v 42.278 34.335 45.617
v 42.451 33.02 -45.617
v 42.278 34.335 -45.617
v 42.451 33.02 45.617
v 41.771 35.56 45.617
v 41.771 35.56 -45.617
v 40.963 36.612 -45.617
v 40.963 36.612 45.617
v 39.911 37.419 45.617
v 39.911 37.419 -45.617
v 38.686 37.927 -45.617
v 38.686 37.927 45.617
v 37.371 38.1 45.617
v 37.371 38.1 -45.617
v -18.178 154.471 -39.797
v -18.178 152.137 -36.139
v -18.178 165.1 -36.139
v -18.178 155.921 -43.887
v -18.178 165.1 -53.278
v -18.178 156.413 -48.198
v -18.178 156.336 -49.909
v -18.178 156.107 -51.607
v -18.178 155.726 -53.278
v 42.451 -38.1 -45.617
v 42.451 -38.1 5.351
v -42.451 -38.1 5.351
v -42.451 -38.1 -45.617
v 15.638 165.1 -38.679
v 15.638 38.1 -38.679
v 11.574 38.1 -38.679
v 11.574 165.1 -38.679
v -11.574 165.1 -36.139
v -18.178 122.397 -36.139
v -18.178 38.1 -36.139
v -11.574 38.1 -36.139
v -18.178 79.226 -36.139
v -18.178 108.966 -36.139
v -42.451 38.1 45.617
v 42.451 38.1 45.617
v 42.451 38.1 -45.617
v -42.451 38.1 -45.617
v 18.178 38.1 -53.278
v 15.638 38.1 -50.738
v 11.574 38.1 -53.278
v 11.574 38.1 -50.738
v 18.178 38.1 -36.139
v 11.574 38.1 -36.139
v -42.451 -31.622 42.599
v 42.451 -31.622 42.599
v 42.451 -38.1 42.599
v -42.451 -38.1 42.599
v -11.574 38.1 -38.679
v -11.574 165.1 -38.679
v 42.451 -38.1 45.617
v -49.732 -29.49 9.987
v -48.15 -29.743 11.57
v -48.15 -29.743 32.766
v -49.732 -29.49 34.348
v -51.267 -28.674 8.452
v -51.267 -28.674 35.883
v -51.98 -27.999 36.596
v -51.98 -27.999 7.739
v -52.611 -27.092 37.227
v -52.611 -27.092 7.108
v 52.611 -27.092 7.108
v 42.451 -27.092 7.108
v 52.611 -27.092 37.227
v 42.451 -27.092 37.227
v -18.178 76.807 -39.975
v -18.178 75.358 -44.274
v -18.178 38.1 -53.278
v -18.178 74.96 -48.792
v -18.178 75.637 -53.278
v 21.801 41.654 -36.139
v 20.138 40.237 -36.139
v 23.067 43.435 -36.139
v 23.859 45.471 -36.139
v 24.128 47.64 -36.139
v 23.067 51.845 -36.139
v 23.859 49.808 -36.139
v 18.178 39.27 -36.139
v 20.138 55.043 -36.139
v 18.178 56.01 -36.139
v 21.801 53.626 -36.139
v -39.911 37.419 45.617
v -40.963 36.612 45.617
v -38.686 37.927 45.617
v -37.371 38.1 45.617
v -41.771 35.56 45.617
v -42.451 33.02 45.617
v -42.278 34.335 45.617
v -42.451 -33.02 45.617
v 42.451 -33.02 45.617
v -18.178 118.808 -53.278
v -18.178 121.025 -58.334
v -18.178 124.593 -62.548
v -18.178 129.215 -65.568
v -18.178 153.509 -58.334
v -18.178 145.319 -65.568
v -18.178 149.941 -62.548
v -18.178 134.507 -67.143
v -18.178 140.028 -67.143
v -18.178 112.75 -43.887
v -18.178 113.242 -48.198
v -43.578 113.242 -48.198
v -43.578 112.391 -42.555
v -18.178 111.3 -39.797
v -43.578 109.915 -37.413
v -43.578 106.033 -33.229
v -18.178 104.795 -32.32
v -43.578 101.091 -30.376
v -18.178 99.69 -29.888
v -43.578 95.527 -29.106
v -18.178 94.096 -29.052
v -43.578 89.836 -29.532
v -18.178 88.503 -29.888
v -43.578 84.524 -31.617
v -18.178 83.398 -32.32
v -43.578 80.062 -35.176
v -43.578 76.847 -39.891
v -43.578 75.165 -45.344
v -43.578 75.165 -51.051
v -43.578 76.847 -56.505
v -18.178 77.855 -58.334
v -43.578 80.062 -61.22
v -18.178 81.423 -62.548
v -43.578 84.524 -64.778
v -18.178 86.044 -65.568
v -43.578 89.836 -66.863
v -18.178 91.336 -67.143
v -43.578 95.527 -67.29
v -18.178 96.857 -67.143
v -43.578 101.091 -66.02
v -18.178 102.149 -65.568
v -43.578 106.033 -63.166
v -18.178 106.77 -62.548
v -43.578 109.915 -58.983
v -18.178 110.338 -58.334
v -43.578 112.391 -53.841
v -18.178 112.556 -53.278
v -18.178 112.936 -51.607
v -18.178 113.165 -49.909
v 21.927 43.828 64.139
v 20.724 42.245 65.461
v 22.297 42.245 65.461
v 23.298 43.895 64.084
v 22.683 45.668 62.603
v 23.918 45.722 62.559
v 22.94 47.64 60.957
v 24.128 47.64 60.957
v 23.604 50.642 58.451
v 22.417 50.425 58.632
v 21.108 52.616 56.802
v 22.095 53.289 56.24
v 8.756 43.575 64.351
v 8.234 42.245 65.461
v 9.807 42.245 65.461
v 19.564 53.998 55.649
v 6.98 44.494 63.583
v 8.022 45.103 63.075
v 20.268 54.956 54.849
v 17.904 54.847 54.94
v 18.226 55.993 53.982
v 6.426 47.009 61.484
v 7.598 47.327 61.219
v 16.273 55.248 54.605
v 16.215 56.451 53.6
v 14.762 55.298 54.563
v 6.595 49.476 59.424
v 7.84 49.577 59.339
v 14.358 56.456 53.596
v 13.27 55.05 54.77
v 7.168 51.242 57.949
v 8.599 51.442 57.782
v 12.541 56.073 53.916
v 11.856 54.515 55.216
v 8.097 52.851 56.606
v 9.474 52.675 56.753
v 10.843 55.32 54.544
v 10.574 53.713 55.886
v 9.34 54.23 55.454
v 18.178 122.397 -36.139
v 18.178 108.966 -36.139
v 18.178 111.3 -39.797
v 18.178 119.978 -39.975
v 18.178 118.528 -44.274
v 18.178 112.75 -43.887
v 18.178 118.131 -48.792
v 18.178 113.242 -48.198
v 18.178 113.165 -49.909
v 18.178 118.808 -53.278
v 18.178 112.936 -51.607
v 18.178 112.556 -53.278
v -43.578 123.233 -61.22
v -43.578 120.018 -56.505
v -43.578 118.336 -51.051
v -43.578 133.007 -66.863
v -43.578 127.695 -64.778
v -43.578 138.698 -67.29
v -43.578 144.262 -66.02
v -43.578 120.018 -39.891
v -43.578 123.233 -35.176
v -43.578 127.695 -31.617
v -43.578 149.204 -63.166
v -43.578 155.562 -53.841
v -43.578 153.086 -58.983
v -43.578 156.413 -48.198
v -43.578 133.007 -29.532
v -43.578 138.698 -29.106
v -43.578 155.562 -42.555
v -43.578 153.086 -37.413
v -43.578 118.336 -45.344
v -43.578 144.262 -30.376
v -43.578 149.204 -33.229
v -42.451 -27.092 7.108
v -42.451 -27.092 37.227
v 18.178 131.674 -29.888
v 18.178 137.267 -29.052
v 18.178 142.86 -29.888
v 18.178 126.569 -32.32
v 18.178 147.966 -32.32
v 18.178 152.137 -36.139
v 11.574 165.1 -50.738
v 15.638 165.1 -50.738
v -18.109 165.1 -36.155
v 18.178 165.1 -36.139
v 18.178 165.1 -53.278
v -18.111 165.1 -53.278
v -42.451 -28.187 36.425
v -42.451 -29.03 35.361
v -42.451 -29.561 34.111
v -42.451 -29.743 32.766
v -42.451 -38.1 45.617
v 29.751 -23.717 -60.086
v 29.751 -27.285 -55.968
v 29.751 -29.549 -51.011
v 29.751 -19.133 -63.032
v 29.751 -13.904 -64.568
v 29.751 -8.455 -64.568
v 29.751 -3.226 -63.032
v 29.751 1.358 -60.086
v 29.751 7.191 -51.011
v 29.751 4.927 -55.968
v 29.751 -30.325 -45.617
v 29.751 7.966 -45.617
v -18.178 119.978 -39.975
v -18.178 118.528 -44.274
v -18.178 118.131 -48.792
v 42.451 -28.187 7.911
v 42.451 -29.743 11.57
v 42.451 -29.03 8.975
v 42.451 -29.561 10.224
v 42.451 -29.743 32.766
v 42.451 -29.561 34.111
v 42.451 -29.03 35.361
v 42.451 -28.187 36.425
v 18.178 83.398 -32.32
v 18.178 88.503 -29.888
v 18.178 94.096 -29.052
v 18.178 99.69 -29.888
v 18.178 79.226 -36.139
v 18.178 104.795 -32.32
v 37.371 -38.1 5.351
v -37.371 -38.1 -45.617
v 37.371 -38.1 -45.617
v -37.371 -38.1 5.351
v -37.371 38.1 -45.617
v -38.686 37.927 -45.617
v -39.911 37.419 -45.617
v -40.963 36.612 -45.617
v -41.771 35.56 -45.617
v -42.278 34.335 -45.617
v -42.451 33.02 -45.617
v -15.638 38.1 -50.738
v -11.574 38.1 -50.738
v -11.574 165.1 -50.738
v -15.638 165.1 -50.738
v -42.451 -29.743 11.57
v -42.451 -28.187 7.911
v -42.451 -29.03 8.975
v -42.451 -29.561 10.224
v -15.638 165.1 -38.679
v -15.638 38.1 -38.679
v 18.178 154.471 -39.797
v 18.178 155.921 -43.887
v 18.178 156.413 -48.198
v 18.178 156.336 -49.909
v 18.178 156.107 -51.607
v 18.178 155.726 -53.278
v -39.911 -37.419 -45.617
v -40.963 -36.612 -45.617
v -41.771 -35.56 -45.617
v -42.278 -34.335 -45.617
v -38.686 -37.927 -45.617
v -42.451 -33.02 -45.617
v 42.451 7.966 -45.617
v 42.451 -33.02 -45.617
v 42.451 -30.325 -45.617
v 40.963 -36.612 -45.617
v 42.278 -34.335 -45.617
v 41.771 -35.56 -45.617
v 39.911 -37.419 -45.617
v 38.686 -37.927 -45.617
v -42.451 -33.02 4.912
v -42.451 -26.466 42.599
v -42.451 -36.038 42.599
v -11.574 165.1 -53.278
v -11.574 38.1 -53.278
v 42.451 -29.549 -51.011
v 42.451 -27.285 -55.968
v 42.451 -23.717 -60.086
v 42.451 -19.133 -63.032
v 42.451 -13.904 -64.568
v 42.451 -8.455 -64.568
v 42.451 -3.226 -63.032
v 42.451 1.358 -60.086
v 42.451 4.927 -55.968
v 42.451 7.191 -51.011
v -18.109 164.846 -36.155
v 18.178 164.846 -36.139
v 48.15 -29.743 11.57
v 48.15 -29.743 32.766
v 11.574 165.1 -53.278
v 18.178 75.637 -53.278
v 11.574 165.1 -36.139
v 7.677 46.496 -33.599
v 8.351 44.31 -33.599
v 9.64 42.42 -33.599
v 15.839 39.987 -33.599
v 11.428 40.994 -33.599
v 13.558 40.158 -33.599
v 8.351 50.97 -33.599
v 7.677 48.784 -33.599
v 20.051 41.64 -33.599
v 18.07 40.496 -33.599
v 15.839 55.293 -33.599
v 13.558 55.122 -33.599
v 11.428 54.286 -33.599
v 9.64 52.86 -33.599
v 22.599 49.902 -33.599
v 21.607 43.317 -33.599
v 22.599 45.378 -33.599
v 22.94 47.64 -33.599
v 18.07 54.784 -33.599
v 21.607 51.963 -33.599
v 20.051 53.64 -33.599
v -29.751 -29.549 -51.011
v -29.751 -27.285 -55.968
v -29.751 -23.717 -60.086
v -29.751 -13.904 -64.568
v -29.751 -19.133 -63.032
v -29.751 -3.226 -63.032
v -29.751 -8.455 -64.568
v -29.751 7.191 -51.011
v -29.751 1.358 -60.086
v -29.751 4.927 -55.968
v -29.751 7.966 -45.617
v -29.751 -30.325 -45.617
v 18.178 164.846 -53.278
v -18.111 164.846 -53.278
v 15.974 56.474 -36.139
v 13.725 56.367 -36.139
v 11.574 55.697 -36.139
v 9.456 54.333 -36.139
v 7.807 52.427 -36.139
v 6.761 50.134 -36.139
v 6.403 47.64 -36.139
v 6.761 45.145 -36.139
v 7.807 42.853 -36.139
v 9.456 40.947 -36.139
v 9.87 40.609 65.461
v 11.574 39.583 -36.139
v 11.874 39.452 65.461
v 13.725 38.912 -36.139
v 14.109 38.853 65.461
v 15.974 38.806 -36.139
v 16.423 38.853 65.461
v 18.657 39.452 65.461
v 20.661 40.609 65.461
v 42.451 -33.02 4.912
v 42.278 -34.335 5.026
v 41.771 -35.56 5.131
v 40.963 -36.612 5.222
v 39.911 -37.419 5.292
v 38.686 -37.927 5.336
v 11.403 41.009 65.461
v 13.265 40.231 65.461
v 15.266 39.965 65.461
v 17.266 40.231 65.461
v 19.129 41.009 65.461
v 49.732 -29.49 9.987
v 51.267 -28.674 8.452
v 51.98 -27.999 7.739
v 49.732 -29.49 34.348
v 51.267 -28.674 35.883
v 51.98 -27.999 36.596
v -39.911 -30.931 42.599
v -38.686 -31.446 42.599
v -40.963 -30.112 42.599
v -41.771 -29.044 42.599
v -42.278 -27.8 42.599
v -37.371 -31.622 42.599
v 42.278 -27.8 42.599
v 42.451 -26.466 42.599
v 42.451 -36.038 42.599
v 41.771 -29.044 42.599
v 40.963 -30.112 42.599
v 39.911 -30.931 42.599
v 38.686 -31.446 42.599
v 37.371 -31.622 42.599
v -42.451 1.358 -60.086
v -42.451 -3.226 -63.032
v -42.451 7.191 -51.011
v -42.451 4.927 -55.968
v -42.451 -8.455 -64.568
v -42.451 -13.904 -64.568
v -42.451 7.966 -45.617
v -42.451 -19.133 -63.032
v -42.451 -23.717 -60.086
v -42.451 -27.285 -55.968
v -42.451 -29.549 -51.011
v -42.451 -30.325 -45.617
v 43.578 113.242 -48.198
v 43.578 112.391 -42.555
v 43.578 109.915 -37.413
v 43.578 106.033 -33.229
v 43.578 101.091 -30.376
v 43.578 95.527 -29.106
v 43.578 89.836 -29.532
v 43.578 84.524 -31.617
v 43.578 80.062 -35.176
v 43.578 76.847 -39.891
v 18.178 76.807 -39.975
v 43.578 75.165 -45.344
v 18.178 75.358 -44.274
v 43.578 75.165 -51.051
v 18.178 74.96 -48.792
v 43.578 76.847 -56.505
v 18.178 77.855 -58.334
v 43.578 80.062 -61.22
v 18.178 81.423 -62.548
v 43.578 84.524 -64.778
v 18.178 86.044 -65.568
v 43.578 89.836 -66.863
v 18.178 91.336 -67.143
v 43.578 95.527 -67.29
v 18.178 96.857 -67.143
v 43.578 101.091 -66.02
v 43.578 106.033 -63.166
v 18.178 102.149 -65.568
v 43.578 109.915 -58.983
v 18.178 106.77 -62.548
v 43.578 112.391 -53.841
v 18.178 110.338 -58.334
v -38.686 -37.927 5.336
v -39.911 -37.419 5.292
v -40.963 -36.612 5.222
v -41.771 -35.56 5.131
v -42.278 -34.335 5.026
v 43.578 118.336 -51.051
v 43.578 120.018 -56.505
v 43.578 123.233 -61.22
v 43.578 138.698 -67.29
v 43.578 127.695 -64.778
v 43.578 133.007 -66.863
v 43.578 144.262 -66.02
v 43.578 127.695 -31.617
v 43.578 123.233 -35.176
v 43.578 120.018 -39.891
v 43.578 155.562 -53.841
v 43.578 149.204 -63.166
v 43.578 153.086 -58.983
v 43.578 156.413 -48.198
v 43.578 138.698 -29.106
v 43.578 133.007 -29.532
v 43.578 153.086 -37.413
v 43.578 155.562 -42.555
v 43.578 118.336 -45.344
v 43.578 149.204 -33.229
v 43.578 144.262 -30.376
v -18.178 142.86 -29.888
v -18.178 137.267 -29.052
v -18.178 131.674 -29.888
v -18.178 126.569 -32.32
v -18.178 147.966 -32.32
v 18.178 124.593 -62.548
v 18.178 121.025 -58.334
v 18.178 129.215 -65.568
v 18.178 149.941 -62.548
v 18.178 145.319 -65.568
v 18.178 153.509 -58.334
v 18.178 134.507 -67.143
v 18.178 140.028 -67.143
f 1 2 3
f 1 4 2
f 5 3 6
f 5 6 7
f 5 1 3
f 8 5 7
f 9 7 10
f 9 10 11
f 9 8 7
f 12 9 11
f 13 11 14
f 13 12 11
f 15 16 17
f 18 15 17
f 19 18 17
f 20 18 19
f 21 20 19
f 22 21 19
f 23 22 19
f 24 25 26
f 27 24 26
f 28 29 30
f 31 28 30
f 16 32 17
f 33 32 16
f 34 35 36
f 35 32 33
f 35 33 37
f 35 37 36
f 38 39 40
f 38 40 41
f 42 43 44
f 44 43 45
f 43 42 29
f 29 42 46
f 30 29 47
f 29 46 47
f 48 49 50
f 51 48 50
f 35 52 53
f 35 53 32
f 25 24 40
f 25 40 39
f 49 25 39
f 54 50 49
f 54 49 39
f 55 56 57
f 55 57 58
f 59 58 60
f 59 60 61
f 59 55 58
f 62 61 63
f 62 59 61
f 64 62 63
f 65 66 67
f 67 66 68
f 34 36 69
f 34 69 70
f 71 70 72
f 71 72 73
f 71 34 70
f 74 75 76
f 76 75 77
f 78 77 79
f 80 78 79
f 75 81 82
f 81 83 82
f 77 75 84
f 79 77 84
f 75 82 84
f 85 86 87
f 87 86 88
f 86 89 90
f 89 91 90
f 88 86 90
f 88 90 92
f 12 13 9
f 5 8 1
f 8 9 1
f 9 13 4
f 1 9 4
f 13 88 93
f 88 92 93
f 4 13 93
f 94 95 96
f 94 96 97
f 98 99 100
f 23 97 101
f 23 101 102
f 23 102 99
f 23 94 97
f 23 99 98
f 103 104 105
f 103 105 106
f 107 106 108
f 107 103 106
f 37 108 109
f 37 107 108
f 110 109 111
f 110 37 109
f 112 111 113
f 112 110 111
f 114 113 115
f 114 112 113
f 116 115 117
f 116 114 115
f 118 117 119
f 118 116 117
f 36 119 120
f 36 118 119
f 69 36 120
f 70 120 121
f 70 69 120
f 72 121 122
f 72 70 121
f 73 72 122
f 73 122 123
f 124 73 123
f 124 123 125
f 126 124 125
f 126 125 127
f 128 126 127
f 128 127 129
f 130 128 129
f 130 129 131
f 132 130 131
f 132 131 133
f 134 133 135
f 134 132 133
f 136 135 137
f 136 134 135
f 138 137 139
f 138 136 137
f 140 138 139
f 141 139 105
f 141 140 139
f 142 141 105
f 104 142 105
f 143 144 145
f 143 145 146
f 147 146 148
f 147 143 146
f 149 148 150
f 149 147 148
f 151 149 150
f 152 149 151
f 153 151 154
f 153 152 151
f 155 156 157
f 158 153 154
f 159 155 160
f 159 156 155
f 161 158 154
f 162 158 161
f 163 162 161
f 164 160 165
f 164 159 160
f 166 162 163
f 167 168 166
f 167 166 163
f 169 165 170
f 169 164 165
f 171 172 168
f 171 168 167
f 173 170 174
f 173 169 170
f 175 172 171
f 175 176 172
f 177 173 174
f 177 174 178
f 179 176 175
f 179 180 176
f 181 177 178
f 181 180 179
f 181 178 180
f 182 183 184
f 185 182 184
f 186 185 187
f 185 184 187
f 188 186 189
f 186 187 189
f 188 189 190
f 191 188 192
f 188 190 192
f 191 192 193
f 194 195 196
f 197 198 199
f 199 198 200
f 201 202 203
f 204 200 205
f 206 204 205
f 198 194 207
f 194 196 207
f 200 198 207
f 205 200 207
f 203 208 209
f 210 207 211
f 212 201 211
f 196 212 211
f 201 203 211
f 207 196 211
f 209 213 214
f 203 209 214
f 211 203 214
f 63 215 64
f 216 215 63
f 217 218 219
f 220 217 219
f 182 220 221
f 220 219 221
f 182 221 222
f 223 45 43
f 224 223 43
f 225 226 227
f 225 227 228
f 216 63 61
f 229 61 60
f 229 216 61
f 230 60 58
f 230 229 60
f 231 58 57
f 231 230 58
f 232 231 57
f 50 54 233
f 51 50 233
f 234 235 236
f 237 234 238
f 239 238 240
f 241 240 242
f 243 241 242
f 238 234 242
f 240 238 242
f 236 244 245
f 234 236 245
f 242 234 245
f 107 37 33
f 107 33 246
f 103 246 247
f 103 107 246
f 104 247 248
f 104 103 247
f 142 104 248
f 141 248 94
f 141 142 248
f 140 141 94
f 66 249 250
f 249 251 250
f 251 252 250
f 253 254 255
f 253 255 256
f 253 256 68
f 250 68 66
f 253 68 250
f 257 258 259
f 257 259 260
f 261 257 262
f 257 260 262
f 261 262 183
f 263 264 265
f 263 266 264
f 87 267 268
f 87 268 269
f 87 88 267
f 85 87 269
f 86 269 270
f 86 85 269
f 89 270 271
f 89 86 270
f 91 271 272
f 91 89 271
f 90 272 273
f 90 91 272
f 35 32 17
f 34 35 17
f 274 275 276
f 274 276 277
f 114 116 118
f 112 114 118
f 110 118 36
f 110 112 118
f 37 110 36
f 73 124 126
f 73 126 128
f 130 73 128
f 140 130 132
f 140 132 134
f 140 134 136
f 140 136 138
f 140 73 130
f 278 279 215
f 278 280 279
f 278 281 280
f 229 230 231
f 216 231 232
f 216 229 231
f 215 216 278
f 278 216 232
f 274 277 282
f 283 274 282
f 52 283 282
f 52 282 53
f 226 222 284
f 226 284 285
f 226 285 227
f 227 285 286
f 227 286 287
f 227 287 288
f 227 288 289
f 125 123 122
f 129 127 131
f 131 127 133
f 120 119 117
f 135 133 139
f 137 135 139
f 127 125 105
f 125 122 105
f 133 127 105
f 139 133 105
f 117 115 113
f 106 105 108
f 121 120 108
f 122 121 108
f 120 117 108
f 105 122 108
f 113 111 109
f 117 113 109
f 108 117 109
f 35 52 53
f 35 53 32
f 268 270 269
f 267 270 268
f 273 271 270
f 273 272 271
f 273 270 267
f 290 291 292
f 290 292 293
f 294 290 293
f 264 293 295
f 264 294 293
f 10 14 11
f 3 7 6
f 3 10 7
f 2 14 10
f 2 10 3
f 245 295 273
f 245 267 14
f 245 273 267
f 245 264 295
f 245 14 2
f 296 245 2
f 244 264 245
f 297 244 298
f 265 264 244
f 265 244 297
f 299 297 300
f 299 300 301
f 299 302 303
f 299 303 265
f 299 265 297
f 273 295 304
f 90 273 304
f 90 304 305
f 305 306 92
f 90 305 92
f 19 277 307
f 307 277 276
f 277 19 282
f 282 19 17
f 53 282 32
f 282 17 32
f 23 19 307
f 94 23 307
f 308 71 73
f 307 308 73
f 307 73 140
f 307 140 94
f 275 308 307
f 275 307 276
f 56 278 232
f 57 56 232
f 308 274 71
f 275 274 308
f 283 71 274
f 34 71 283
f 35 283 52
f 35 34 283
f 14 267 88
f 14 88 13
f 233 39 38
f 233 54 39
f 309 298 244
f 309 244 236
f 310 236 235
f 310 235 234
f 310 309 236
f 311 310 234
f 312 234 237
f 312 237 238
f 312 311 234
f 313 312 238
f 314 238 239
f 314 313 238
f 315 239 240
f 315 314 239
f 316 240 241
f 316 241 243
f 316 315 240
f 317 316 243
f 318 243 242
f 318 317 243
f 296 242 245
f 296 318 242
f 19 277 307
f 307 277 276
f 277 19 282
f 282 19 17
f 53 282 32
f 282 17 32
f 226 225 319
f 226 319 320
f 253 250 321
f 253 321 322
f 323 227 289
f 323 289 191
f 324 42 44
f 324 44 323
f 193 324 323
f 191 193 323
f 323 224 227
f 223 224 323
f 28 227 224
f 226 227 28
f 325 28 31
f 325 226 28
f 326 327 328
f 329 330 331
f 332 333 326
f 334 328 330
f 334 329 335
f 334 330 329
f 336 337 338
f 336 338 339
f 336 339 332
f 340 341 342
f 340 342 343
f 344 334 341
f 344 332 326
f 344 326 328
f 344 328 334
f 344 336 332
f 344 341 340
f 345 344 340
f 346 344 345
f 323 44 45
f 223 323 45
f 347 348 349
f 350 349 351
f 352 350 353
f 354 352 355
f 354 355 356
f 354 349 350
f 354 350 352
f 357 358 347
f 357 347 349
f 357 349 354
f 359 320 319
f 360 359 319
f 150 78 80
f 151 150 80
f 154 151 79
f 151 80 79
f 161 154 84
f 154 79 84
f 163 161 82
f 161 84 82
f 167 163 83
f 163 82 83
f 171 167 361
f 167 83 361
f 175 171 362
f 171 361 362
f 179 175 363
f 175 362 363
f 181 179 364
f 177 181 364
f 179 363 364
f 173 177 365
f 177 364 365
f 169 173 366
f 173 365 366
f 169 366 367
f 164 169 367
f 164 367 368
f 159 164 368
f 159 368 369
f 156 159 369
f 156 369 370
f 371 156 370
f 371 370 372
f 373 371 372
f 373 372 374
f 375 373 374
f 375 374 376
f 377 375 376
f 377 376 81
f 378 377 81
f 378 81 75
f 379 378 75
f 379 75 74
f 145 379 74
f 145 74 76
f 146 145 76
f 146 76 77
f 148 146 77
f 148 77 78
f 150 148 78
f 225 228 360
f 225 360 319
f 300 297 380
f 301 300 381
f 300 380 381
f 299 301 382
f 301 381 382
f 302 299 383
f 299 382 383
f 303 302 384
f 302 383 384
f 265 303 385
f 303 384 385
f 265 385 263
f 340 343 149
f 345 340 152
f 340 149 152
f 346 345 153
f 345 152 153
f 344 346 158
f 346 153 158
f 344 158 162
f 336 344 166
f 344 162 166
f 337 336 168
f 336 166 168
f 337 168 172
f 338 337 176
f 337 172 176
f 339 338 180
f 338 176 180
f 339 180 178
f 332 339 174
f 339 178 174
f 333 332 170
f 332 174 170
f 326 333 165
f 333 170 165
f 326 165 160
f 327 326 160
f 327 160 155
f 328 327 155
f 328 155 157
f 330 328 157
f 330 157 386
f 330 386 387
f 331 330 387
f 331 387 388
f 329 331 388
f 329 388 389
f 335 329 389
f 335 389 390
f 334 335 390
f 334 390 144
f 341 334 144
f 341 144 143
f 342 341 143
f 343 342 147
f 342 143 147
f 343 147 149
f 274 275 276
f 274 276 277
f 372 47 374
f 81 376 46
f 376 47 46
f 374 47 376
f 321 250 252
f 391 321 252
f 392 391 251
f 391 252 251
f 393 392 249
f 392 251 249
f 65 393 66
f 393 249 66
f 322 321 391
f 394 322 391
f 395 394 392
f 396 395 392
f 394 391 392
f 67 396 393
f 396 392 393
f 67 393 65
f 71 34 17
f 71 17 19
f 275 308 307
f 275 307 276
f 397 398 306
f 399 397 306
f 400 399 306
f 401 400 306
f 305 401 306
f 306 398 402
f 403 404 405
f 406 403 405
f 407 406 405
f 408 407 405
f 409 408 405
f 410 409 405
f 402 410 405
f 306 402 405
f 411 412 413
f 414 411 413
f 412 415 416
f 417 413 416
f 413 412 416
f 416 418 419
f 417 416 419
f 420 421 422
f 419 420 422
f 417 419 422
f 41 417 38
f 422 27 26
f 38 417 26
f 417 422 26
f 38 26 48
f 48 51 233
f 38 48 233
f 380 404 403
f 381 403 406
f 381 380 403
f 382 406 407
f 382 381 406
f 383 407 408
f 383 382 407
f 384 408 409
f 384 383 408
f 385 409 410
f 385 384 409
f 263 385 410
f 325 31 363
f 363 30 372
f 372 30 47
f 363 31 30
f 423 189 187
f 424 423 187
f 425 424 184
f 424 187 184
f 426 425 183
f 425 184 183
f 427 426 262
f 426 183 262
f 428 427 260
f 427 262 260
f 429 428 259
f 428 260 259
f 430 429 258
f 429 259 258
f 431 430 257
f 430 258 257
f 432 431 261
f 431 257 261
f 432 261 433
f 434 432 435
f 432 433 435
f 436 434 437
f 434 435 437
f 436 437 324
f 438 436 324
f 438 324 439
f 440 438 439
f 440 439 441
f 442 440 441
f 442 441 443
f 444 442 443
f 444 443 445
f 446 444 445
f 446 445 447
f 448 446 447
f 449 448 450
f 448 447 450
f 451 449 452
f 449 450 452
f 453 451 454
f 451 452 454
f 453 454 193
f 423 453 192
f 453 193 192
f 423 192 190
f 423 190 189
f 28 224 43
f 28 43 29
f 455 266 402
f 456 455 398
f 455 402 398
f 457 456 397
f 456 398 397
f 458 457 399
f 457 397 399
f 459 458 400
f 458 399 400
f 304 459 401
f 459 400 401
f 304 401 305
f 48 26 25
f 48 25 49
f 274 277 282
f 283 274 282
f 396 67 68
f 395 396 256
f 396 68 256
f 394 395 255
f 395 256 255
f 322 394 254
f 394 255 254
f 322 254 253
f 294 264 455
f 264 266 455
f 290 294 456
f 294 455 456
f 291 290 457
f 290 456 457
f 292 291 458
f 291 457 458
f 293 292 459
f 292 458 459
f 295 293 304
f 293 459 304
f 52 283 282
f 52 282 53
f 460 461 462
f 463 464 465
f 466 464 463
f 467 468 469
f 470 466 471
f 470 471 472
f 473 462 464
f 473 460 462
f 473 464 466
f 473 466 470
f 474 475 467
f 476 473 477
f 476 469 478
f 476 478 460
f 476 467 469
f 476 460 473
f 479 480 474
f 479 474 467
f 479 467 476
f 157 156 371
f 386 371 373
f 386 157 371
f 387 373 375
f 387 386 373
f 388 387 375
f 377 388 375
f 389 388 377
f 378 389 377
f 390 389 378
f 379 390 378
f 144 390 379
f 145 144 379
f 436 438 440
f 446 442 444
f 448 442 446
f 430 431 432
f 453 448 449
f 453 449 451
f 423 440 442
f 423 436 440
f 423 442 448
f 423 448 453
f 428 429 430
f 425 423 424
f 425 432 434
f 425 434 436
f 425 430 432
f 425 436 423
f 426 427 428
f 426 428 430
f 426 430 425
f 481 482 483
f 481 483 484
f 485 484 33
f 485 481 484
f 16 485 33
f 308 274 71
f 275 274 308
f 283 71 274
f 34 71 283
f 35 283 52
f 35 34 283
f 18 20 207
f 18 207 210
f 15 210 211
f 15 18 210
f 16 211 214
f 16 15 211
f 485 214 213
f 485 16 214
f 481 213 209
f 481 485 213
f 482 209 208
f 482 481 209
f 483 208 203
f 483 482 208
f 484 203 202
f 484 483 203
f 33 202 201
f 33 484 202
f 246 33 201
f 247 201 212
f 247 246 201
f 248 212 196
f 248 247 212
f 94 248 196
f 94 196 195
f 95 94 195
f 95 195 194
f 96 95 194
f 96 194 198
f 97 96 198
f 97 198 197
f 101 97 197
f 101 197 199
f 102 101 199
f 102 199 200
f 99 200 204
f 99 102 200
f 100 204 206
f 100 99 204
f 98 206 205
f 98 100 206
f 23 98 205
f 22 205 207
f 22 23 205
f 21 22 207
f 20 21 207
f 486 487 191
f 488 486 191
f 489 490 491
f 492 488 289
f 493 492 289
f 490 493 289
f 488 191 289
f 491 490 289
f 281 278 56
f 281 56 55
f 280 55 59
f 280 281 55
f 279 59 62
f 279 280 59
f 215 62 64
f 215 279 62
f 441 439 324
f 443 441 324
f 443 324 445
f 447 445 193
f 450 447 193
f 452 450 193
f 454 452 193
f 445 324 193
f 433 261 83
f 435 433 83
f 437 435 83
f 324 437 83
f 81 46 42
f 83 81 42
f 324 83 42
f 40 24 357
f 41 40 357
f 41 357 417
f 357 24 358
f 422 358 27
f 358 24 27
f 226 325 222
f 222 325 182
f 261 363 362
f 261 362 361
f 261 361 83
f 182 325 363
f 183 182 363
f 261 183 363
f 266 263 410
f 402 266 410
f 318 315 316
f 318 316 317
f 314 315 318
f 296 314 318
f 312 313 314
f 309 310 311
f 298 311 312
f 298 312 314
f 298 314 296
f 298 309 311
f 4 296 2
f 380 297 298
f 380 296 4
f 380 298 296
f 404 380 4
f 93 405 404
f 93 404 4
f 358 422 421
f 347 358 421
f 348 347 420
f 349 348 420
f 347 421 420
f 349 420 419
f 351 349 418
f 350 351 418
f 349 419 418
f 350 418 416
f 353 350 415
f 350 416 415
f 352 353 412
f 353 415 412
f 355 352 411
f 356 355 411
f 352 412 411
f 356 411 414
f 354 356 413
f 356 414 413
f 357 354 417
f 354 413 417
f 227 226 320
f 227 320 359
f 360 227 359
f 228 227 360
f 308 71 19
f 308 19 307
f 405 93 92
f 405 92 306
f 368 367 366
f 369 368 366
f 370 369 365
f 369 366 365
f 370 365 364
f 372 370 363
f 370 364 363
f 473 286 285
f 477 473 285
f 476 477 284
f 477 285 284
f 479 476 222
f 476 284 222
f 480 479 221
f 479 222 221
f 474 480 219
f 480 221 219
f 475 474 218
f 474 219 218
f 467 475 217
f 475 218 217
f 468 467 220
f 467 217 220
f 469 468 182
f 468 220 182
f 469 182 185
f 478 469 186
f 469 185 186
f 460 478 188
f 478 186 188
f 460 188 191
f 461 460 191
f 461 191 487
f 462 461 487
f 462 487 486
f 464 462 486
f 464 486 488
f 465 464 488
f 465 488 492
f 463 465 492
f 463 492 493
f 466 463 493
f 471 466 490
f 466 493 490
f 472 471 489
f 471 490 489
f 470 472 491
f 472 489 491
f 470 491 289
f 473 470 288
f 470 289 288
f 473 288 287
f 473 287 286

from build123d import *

# Parameters (mm, degrees)
F0_W          = 84.9026963115
F0_H          = 91.2344232202
F1_DEPTH      = 38.1
F3_DEPTH      = 42.4523481557
F3_DEPTH_BACK = 42.4523481557
F4_R          = 19.1453288311
F5_DEPTH      = 12.7
F8_DEPTH      = 127
F10_R         = 19.1453262
F11_DEPTH     = 25.4
F13_R         = 5.08
F14_T1_DEPTH  = 111.0309954692
F15_R         = 8.8626036941
F16_DEPTH     = 101.6
F17_R         = 7.6745278719
F18_DEPTH     = 99.06
F20_DEPTH     = 43.5794721032
F21_W         = 2.6513483719
F21_H         = 30.1193892955
F22_DEPTH     = 10.16
F23_T1_DEPTH  = 32.4692196578
F23_T3_DEPTH  = 52.4286089533
F26_DEPTH     = 0.254


# Not quite as in the source:
# - a fillet or chamfer that OpenCascade refuses, or shapes differently, is made with other operations: its cross-section is extruded or revolved along the edge and cut away or added


with BuildPart() as f1:
    # F0 (on Front) → F1 (new body, symmetric)
    with BuildSketch(Plane.XZ):
        Rectangle(F0_W, F0_H)
    extrude(amount=F1_DEPTH, both=True)

    # F2 (on Right) → F3 (cut, two sides)
    with BuildSketch(Plane.YZ) as f3_sk:
        Polygon((-38.9483012259, 42.5993576646), (-38.1342619658, 5.1536280662), (-31.6219590604, 42.5993576646), align=None)
    extrude(amount=-F3_DEPTH, mode=Mode.SUBTRACT)
    extrude(f3_sk.sketch, amount=F3_DEPTH_BACK, mode=Mode.SUBTRACT)

    # F4 (on face) → F5 (join)
    with BuildSketch(Plane.YZ.offset(42.4513481557)):
        with Locations((-11.1792916432, -45.6172116101)):
            Circle(F4_R)
    extrude(amount=-F5_DEPTH)


with BuildPart() as f6_1:
    # F6: instance of F1
    add(f1.part.mirror(Plane.YZ))


with BuildPart() as f8:
    # F7 (on face) → F8 (new body)
    with BuildSketch(Plane(origin=(0, 38.1, 0), x_dir=(-1, 0, 0), z_dir=(0, 1, 0))):
        Polygon((-18.1784721032, -53.2778071603), (-11.5744721032, -53.2778071603), (-11.5744721032, -50.7378071603), (-15.6384721032, -50.7378071603), (-15.6384721032, -38.6785142068), (-11.5744721032, -38.6785142068), (-11.5744721032, -36.1385142068), (-18.1784721032, -36.1385142068), align=None)
    extrude(amount=F8_DEPTH)


with BuildPart() as f9_1:
    # F9: instance of F8
    add(f8.part.mirror(Plane.YZ))


with BuildPart() as f8_1:
    add(f8.part)

    # F10 (on face) → F11 (join)
    with BuildSketch(Plane.YZ.offset(18.1784721032)):
        with Locations((137.2673511505, -48.1978071603)):
            Circle(F10_R)
        with Locations((94.0964892507, -48.1978071603)):
            Circle(F10_R)
    extrude(amount=F11_DEPTH)


with BuildPart() as f12_1:
    # F12: instance of F8
    add(f8_1.part.mirror(Plane.YZ))


with BuildPart() as f1_1:
    add(f1.part)

    # F13
    f13_edges = [f1_1.edges().sort_by_distance(p)[0] for p in [
        (42.451348, -38.1, -20.133289),
        (42.451348, -34.86098, 23.974996),
        (-42.451348, -38.1, -20.133289),
        (-42.451348, -34.86098, 23.974996),
        (42.451348, 38.1, 0),
        (-42.451348, 38.1, 0),
    ]]
    fillet(f13_edges, radius=F13_R)

    # F14: chamfer of 5.08 on 1 edges, made by hand

    # F14_s2 → F14_t1 (cut)
    with BuildSketch(Plane.YZ.offset(-55.5154977346)):
        Polygon((-33.02, 45.6172116101), (-38.1, 40.5372116101), (-38.1, 45.6172116101), align=None)
    extrude(amount=F14_T1_DEPTH, mode=Mode.SUBTRACT)


with BuildPart() as f8_2:
    add(f8_1.part)

    # F15 (on face) → F16 (join)
    with BuildSketch(Plane.XY.offset(-36.1385142068)):
        with Locations((15.265696682, 47.6398468018)):
            Circle(F15_R)
    extrude(amount=F16_DEPTH)

    # F17 (on face) → F18 (cut)
    with BuildSketch(Plane.XY.offset(65.4614857932)):
        with Locations((15.265696682, 47.6398468018)):
            Circle(F17_R)
    extrude(amount=-F18_DEPTH, mode=Mode.SUBTRACT)

    # F19 (on Right) → F20 (cut, through all)
    with BuildSketch(Plane.YZ):
        Polygon((58.7693750858, 70.7835555077), (33.8418483734, 72.4776536226), (58.7693750858, 51.6643822193), align=None)
    extrude(amount=F20_DEPTH, mode=Mode.SUBTRACT)


with BuildPart() as f22:
    # F21 (on face) → F22 (new body)
    with BuildSketch(Plane.YZ.offset(42.4513481557)):
        with Locations((-28.417179361, 22.1676826477)):
            Rectangle(F21_W, F21_H)
    extrude(amount=F22_DEPTH)

    # F23: fillet of radius 5.08 on 3 edges, made by hand

    # F23_s2 → F23_t1 (cut)
    with BuildSketch(Plane.YZ.offset(31.2967383268)):
        with BuildLine():
            ThreePointArc((-27.091505175, 37.2273772955), (-29.0300008006, 35.360610408), (-29.742853547, 32.7655333639))
            Line((-29.742853547, 32.7655333639), (-29.742853547, 37.2273772955))
            Line((-29.742853547, 37.2273772955), (-27.091505175, 37.2273772955))
        make_face()
        with BuildLine():
            ThreePointArc((-29.742853547, 11.5698319316), (-29.0300008006, 8.9747548875), (-27.091505175, 7.107988))
            Line((-27.091505175, 7.107988), (-29.742853547, 7.107988))
            Line((-29.742853547, 7.107988), (-29.742853547, 11.5698319316))
        make_face()
    extrude(amount=F23_T1_DEPTH, mode=Mode.SUBTRACT)

    # F23_s4 → F23_t3 (cut)
    with BuildSketch(Plane.XY.offset(-4.0466218289)):
        with BuildLine():
            ThreePointArc((48.1495042242, -29.742853547), (50.7445812683, -29.0300008006), (52.6113481557, -27.091505175))
            Line((52.6113481557, -27.091505175), (52.6113481557, -29.742853547))
            Line((52.6113481557, -29.742853547), (48.1495042242, -29.742853547))
        make_face()
    extrude(amount=F23_T3_DEPTH, mode=Mode.SUBTRACT)


with BuildPart() as f24_1:
    # F24: instance of F22
    add(f22.part.mirror(Plane.YZ))


with BuildPart() as f26:
    # F25 (on face) → F26 (new body)
    with BuildSketch(Plane(origin=(0, 165.1, 0), x_dir=(-1, 0, 0), z_dir=(0, 1, 0))):
        Polygon((18.1113947183, -53.2778071603), (18.1086789817, -36.1547134817), (-18.1784721032, -36.1385142068), (-18.1784721032, -53.2778071603), align=None)
    extrude(amount=-F26_DEPTH)


solid = Compound([f6_1.part, f9_1.part, f12_1.part, f1_1.part, f8_2.part, f22.part, f24_1.part, f26.part])
